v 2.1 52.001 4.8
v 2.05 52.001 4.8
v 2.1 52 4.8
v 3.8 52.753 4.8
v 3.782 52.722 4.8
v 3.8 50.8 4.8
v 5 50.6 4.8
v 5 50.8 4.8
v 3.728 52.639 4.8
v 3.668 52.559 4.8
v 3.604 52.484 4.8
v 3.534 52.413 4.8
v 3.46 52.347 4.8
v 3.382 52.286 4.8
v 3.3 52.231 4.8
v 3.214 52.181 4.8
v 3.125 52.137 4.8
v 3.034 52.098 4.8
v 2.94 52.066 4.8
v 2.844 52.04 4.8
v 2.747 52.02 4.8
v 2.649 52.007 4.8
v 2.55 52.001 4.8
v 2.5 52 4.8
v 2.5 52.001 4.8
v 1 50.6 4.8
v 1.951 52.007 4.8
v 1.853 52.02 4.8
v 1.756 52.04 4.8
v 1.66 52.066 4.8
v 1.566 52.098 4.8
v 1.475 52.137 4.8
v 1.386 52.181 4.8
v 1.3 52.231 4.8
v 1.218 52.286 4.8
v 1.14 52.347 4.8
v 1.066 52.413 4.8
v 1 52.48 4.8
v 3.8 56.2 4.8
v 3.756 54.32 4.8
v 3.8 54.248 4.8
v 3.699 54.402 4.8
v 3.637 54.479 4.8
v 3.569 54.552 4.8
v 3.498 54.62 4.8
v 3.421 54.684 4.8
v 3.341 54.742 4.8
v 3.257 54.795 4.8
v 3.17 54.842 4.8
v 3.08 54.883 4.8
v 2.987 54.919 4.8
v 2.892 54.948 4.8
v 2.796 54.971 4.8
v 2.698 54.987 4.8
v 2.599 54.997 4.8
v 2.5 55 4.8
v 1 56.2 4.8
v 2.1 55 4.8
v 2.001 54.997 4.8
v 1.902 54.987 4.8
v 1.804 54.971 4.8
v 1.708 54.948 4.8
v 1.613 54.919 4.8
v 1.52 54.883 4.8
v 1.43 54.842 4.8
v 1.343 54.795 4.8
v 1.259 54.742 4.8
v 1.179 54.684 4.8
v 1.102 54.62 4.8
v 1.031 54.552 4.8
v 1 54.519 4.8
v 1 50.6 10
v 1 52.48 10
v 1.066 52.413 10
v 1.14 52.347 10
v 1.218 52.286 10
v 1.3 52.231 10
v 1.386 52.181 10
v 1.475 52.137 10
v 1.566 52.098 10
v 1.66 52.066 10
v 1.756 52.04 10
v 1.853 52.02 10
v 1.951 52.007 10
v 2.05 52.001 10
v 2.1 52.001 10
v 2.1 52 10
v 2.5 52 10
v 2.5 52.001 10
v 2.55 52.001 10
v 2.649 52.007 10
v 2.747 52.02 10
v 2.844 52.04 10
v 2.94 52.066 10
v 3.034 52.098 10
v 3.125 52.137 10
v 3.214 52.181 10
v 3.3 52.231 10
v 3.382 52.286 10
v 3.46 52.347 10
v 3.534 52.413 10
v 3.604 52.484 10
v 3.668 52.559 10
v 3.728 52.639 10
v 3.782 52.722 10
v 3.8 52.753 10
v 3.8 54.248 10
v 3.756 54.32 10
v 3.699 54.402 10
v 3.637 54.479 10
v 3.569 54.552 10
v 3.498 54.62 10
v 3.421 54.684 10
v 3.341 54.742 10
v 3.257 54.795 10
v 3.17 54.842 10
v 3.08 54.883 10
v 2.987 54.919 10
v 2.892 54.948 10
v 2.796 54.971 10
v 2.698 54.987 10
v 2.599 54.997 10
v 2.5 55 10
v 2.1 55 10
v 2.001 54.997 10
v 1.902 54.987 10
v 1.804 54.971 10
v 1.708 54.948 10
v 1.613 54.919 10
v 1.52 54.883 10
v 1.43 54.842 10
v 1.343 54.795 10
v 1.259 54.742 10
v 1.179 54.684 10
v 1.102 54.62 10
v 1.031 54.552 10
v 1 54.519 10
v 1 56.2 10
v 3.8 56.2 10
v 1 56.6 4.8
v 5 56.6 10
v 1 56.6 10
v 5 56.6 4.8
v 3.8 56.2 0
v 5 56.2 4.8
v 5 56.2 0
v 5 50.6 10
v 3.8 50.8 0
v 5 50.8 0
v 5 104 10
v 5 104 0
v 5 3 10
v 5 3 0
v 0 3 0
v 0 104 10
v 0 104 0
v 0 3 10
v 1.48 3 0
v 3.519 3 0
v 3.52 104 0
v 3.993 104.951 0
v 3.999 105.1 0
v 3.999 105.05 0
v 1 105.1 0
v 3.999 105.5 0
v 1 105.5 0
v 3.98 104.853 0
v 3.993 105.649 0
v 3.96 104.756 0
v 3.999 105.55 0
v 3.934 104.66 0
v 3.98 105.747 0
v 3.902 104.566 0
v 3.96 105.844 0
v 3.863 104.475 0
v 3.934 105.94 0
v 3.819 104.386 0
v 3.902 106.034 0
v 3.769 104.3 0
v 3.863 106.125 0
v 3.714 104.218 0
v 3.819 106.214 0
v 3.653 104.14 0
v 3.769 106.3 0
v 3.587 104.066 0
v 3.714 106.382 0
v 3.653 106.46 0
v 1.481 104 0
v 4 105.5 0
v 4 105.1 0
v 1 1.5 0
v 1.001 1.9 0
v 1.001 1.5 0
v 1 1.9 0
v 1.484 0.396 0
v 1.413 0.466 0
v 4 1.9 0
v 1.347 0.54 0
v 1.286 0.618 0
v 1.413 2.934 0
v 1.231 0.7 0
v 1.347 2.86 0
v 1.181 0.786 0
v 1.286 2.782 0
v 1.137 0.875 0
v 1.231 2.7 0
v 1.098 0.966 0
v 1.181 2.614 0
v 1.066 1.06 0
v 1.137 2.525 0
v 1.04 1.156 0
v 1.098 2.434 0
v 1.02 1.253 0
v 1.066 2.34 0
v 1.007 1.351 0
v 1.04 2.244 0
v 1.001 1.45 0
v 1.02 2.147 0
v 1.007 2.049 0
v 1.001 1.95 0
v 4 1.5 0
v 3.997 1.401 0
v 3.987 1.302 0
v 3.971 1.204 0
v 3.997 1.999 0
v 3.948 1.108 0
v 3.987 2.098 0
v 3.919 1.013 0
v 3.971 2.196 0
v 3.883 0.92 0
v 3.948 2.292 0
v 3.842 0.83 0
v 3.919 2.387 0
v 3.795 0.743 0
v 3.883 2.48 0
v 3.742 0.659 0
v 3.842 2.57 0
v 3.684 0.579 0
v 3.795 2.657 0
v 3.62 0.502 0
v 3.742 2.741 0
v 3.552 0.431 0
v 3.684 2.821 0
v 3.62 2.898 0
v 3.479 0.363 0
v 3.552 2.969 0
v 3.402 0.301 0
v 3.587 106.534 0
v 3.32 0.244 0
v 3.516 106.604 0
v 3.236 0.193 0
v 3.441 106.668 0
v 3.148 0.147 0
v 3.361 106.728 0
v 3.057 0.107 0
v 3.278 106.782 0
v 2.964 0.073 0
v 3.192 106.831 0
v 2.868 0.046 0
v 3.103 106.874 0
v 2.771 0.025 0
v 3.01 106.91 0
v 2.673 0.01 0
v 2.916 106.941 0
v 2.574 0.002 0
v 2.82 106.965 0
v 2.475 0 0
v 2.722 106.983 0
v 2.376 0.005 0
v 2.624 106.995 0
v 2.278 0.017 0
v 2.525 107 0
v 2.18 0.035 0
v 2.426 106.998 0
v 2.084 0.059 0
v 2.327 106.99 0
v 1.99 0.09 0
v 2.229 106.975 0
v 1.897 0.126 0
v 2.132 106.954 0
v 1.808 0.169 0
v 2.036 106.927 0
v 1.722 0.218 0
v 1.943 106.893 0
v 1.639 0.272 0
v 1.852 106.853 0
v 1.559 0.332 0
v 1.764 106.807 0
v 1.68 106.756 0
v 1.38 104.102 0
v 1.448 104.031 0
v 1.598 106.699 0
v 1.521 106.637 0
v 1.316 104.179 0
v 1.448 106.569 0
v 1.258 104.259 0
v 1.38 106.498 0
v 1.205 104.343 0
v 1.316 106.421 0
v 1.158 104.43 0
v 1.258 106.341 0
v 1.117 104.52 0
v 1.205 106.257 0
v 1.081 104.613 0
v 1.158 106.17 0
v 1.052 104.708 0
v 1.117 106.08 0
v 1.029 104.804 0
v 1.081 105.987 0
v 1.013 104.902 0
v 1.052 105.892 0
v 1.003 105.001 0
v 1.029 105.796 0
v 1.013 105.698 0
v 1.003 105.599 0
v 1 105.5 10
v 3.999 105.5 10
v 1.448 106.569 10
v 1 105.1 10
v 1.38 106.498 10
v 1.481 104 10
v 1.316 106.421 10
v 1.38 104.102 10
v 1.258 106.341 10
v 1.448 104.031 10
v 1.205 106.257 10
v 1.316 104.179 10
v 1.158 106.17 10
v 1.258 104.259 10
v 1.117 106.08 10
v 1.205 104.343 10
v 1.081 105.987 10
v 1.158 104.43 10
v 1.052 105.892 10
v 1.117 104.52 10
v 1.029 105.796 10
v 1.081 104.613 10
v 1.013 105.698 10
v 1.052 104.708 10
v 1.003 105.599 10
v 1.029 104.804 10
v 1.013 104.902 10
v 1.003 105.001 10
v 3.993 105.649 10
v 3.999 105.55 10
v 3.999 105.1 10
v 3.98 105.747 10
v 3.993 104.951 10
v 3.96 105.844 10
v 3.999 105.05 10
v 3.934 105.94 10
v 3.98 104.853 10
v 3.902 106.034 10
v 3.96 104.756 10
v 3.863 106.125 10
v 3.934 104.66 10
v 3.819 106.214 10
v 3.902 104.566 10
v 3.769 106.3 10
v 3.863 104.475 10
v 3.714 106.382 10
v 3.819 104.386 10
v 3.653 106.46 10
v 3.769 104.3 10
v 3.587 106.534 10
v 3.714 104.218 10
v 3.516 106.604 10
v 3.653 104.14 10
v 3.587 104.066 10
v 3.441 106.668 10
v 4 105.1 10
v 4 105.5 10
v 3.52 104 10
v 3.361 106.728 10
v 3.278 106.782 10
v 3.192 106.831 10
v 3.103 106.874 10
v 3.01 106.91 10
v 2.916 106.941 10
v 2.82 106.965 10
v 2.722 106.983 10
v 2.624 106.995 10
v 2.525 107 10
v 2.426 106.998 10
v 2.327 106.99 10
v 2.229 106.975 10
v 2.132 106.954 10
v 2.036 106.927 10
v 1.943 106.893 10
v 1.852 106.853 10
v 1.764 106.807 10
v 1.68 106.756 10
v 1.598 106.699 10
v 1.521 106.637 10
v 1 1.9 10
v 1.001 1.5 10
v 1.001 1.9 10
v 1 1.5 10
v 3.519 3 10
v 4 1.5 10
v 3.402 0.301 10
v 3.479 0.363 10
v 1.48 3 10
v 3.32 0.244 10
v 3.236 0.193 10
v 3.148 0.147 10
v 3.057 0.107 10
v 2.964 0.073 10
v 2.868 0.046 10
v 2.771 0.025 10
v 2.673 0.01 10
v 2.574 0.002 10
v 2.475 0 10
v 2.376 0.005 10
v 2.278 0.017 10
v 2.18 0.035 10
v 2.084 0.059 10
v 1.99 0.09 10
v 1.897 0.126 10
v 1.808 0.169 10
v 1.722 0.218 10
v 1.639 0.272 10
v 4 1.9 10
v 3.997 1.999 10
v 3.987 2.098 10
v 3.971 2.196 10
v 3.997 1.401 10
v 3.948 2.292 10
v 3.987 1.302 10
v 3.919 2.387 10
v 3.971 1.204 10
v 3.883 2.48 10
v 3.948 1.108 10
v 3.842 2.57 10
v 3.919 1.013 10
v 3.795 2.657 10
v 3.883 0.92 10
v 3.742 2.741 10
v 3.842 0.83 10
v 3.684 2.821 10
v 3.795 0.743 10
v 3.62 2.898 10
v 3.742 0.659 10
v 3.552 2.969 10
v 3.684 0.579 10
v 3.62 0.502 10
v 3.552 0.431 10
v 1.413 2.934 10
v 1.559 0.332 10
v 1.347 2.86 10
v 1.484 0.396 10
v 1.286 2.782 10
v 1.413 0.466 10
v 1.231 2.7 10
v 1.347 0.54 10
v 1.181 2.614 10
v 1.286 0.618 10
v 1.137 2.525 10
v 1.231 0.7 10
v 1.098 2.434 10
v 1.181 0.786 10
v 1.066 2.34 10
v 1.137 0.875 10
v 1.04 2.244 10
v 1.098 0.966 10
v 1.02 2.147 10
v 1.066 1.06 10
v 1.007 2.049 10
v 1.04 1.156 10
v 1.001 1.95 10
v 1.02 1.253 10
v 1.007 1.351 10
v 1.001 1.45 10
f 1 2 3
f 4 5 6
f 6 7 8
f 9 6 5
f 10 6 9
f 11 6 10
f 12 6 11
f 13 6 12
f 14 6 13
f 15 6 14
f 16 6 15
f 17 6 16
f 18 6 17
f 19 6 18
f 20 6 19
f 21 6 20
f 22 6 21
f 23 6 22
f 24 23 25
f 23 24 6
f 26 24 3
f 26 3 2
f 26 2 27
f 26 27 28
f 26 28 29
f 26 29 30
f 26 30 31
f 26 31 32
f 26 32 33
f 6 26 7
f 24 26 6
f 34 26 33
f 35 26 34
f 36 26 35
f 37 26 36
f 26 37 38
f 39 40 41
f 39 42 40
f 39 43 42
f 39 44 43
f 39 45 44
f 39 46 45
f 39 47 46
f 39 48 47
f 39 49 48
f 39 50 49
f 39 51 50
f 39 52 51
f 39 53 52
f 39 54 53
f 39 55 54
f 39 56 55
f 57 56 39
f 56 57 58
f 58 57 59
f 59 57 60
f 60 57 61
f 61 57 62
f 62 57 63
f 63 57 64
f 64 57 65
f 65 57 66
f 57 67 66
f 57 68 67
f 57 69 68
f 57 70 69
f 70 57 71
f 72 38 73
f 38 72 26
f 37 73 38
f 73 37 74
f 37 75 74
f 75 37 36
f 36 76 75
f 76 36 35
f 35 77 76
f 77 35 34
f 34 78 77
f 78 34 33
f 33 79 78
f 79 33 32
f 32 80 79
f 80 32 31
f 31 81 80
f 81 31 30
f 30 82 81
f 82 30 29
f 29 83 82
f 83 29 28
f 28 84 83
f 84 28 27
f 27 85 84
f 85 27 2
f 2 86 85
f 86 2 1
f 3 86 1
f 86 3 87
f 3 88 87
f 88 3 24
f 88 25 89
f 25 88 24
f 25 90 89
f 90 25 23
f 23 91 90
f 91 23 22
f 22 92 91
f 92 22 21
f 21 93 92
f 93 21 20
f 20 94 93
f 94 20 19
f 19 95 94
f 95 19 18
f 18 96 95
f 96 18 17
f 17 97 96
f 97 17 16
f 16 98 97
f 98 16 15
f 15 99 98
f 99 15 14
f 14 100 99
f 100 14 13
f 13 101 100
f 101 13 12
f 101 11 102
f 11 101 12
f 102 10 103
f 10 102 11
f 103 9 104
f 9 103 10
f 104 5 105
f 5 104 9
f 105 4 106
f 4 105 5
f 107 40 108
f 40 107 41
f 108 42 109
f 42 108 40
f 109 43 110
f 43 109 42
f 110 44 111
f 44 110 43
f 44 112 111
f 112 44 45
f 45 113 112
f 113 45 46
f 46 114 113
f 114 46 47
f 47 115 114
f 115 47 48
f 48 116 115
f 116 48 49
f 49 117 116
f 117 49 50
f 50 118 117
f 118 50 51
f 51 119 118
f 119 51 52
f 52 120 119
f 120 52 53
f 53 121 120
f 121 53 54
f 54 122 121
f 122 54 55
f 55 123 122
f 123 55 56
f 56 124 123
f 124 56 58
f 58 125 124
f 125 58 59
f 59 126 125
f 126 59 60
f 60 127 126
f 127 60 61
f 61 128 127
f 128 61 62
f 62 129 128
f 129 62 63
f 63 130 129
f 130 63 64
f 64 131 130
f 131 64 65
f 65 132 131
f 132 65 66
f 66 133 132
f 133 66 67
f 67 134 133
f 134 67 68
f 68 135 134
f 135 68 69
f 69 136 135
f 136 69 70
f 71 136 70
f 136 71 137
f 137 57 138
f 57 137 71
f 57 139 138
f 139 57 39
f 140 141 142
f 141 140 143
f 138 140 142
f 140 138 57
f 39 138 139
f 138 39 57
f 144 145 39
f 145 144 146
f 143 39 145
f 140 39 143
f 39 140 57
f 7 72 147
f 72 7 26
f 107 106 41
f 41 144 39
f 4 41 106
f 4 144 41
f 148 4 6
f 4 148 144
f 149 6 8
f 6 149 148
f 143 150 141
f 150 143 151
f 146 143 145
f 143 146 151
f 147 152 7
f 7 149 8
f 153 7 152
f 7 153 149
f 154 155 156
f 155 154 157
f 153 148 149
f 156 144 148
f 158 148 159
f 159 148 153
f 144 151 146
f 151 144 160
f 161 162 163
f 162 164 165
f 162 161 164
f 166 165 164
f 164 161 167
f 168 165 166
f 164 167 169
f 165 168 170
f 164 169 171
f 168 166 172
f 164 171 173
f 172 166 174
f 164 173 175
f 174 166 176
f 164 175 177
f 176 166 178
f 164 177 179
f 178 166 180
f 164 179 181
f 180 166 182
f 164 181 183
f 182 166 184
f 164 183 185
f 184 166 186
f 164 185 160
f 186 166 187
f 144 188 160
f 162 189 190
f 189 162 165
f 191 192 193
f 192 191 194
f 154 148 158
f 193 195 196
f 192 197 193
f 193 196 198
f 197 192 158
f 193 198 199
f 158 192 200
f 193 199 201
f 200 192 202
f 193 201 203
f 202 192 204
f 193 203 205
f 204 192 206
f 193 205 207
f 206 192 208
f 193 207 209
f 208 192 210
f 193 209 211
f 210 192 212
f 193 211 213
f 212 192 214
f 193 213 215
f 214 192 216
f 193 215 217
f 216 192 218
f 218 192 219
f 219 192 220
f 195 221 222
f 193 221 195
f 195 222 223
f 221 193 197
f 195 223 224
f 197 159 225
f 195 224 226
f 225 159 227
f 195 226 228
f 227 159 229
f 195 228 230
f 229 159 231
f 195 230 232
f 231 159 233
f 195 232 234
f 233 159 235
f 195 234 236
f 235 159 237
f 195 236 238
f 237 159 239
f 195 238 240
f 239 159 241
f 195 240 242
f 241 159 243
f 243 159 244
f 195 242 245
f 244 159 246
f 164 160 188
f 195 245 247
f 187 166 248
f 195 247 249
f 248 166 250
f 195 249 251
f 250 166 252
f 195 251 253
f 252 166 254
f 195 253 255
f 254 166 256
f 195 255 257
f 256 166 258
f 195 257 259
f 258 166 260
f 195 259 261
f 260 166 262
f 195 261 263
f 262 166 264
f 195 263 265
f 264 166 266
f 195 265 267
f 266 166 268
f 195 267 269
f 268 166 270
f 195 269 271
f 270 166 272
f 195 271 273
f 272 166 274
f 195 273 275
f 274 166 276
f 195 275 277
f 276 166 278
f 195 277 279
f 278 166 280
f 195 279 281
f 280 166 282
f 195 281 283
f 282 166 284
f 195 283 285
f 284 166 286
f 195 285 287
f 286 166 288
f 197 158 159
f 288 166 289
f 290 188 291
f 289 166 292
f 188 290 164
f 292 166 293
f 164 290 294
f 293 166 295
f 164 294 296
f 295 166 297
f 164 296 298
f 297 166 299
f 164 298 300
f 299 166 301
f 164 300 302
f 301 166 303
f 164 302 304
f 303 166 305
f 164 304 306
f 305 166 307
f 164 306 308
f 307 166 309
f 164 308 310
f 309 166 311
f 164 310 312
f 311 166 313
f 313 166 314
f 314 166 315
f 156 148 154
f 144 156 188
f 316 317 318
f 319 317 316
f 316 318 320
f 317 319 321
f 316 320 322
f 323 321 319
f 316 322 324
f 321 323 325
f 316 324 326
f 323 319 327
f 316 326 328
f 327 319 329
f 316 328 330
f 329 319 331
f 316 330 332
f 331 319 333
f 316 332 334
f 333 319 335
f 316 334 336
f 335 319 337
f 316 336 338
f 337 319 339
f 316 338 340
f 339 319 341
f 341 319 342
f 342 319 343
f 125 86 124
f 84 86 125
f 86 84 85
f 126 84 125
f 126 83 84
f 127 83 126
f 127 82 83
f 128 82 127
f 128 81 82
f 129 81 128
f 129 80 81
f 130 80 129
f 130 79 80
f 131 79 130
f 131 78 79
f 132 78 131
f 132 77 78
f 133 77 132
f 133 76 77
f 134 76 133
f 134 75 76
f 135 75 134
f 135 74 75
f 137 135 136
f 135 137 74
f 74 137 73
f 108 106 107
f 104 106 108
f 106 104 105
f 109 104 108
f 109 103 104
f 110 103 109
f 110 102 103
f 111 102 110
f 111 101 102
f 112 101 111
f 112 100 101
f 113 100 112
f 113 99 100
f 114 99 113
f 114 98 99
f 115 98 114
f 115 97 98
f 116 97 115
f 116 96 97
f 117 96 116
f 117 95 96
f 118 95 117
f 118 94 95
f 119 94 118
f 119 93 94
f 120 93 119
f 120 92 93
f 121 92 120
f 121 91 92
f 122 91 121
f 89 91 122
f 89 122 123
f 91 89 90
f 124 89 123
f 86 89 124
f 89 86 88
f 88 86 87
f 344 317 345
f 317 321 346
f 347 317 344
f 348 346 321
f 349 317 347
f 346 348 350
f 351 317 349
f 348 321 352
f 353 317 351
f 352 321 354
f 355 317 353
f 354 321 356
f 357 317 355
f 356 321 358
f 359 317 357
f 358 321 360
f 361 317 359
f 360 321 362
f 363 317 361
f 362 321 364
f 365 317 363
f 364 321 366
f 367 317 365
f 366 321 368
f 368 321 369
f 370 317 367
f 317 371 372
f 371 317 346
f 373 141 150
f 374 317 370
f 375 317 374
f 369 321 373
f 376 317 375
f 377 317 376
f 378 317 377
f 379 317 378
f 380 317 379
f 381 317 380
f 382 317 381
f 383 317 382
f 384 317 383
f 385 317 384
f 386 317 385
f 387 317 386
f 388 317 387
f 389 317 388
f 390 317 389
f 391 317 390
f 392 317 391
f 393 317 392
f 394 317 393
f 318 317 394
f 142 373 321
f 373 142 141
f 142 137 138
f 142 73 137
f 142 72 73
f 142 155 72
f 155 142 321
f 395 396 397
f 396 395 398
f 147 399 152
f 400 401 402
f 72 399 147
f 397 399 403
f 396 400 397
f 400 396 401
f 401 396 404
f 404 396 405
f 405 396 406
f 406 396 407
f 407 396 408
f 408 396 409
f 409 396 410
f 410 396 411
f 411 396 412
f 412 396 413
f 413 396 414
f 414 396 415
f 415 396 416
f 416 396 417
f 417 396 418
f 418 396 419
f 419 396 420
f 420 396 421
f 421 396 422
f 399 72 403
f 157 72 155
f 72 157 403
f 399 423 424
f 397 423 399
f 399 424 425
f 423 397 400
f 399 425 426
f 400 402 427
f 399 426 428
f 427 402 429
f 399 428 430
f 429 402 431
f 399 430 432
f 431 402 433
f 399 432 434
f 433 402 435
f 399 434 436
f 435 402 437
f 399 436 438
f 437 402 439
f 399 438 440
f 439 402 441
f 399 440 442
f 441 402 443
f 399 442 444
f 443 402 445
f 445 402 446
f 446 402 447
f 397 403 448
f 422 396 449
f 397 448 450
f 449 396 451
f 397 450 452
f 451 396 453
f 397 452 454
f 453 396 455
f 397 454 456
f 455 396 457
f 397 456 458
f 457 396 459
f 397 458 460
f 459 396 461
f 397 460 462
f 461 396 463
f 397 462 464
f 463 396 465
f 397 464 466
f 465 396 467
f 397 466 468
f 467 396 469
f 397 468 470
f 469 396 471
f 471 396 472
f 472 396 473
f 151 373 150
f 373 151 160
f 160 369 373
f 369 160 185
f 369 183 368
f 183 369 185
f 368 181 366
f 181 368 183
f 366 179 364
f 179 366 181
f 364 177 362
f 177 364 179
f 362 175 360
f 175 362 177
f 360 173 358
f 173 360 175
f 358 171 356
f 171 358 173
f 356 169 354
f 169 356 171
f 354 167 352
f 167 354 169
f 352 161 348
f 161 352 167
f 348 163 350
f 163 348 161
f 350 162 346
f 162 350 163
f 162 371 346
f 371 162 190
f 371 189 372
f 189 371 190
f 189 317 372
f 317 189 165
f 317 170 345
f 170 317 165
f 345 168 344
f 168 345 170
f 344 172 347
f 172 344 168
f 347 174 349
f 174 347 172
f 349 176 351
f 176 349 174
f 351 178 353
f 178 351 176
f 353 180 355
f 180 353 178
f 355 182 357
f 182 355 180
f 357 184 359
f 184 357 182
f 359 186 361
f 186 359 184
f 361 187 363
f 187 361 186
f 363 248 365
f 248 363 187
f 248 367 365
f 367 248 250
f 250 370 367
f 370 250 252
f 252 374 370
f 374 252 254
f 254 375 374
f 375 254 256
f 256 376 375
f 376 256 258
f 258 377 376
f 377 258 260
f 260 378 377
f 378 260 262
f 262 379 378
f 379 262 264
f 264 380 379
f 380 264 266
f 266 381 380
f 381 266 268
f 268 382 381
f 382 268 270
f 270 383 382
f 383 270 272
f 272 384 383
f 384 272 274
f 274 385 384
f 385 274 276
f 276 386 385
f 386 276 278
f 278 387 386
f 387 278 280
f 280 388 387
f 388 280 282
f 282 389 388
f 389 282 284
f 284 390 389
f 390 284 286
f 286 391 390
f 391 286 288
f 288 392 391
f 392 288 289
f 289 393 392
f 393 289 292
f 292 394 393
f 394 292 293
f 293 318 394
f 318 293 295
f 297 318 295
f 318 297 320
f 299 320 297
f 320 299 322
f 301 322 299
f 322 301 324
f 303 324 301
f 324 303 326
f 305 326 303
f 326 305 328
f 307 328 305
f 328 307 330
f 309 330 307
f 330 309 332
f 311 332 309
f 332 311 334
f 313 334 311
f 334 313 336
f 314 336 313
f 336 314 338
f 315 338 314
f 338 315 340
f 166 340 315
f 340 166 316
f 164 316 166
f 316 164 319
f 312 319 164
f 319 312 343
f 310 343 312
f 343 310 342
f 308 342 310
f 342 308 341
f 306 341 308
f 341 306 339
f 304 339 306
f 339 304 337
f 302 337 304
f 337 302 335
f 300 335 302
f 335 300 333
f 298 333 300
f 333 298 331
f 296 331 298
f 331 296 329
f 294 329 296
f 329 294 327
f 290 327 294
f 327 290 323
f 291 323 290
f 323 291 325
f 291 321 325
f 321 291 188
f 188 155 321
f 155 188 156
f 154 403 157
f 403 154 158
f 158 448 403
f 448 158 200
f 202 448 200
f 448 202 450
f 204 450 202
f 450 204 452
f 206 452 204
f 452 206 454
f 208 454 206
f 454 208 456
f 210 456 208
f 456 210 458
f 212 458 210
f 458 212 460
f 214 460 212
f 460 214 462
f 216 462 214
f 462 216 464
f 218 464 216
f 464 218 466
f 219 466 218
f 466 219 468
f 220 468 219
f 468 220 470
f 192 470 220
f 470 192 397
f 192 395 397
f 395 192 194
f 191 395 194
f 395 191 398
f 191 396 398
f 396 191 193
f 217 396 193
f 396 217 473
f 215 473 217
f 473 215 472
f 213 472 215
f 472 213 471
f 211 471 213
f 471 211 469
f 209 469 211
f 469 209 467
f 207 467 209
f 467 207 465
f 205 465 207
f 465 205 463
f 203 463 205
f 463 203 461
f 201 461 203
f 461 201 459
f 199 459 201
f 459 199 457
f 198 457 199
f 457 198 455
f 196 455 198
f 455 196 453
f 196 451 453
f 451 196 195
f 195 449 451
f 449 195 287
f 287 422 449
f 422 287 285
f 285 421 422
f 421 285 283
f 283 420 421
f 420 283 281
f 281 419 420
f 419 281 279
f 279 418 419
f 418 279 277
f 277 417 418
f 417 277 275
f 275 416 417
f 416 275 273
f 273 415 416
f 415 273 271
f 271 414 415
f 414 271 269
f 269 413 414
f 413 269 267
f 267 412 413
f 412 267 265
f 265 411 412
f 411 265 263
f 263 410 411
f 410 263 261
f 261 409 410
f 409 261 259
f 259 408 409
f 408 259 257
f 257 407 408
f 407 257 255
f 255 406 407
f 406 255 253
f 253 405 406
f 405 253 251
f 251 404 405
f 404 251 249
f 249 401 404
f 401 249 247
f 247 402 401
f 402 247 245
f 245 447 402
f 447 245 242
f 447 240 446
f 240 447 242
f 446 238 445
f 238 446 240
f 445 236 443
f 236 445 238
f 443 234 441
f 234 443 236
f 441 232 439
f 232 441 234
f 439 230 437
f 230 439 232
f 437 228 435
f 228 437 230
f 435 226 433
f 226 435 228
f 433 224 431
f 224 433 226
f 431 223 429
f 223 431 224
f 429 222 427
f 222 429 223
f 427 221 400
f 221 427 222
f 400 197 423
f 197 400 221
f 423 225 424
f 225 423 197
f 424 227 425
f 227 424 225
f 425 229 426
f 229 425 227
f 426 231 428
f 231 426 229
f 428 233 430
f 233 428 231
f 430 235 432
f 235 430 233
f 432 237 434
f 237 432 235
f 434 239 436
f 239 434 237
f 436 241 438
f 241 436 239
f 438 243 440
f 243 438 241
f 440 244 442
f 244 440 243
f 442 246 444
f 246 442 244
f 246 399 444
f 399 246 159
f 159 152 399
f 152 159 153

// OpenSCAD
// file: ../common.scad
module fillet(r = 0.3, r2 = 0.3) {
  // フィレットモジュール
  // 使用例: fillet(r=0.5) { ... }
  // 注意: フィレットはオフセットの前に適用されるため、オフセットと組み合わせて使用することが一般的です。
  offset(r=r) offset(r=-r2) children();
}
// file: constants.scad
$fa = 0.1;
$fs = 0.1;

PITCH = 18;
w = 5;
rH = 7; // 仕切りレール高さ
rB = 2; // 仕切りレールの底面の厚み
pD = 10; // 柱の幅
// pH = 146; // 柱の高さ
pH = 20;
CONNECTOR_CIRCLE_WIDTH = 3; // メスコネクタの幅
CONNECTOR_DEPTH = 3; // メスコネクタの高さ方向の奥行き
CONNECTOR_ELLIPSE_LENGTH = 0.4; // 半円の下にどれくらいの直線区間を付けるか
mfDiff = 0.2; // メスコネクタの差し込み部分の余裕

PLATE_JOINT_SPRING_RADIUS = pD * 2; // プレートジョイントのバネの円の半径
PLATE_JOINT_SPRING_DEPTH = 1.2; // プレートジョイントのバネの厚み
PLATE_JOINT_SPRING_ARC_LENGTH = (pD * 1.5) - (mfDiff * 2); // プレートジョイントのバネの円弧長
PLATE_JOINT_SPRING_PILLAR_WIDTH = 2;
PLATE_JOINT_SPRING_LENGTH = (pD * 2) - (mfDiff * 2); // プレートジョイントのバネの全体の長さ
// main file
include <constants.scad>;
use <../common.scad>;

// 実験用プレート
let () {
  roof_connector(center_male = true);
  // ceiling_connector();
}

// 天井用
module roof_connector(width = PITCH * 6, center_male = false) {
  translate([0, 0, pD]) mirror([1, 0, 0]) rotate([-90, 0, 90])
  let (width = width - 1) {
    difference() {
      cube([width, pD, w]);

      // 両端のコネクタ
      color("red") translate([((0 - rB) + width) - CONNECTOR_DEPTH, pD / 2, w]) rotate([0, 90, 0]) pillar_male();
      color("red") translate([rB + CONNECTOR_DEPTH, pD / 2, 0]) rotate([0, -90, 0]) pillar_male();

      // 中間のコネクタ
      // color("red") translate([width / 2, rB + CONNECTOR_DEPTH, w]) rotate([90, 90, 0]) pillar_male();
      // color("red") translate([width / 2, rB + CONNECTOR_DEPTH, w]) rotate([-90, 90, 0]) pillar_male();
      if (center_male) {
        translate([(width / 2) - (w / 2), 0, -1]) pillar_male(w = w);
        translate([(width / 2) + (w / 2) + mfDiff, (0 - (pD / 2)) + mfDiff, 1]) cube([mfDiff * 2, pD, 10]);
        translate([(width / 2) - (w / 2) - (mfDiff * 2), (0 - (pD / 2)) + mfDiff, 1]) cube([mfDiff * 2, pD, 10]);
        translate([(width / 2), pD / 2, w - mfDiff]) cube([w + (mfDiff * 2), pD * 2, 2], center = true);
      }
    }
  }
}

// 天井同士の縦方向連結
module ceiling_connector(length = 50 + mfDiff, width = w) {
  translate([0, w - mfDiff, 0]) mirror([0, 1, 0]) rotate([90, 0, 0]) linear_extrude(height = (length - (w * 2)) + (mfDiff * 2)) fillet() square([width, 1]);
  translate([w / 2, w - mfDiff, 0]) rotate([90, 0, 0]) linear_extrude(height = (pD / 2) - mfDiff) connector_female_2d(height = 4);
  translate([w / 2, length, 0]) rotate([90, 0, 0]) linear_extrude(height = (pD / 2) - mfDiff) connector_female_2d(height = 4);
}

// 中間の横2連レール
*let () {
  // translate([4, 64, -12]) rotate([90, 0 ,90])
  translate([w, 0, 0])
  {
    rail(length = space);
    translate([0, space + (PITCH * 0), 0]) rail(pillar = true, sideL = false, sideR = false);
    translate([0, space + (PITCH * 1), 0]) rail(pillar = false, sideL = false, sideR = false);
    translate([0, space + (PITCH * 2), 0]) rail(length = PITCH / 2);
    translate([0, space + (PITCH * 2.5), 0]) rail(pillar = true, sideL = false, sideR = false);
    translate([0, space + (PITCH * 3.5), 0]) rail(length = PITCH / 2);
    translate([0, space + (PITCH * 4), 0]) rail(pillar = false, sideL = false, sideR = false);
    translate([0, space + (PITCH * 5), 0]) rail(pillar = true, sideL = false, sideR = false);
    translate([0, space + (PITCH * 6), 0]) rail(length = space);
    translate([0 - w, 0, 0]) {
      rail(length = space);
      translate([0, space + (PITCH * 0), 0]) rail(pillar = true, sideL = false, sideR = false);
      translate([0, space + (PITCH * 1), 0]) rail(pillar = false, sideL = false, sideR = false);
      translate([0, space + (PITCH * 2), 0]) rail(length = PITCH / 2);
      translate([0, space + (PITCH * 2.5), 0]) rail(pillar = true, sideL = false, sideR = false);
      translate([0, space + (PITCH * 3.5), 0]) rail(length = PITCH / 2);
      translate([0, space + (PITCH * 4), 0]) rail(pillar = false, sideL = false, sideR = false);
      translate([0, space + (PITCH * 5), 0]) rail(pillar = true, sideL = false, sideR = false);
      translate([0, space + (PITCH * 6), 0]) rail(length = space);
    }
  }
}

// デスク引っ掛け用のツメ
let (depth = 5, width = pD + (mfDiff * 2), length = 5) {
  *linear_extrude(height = rB - mfDiff)
  {
    translate([0, length])
    let (
      r = PLATE_JOINT_SPRING_RADIUS, // 円の半径。バネの傾きを決定する
      depth = PLATE_JOINT_SPRING_DEPTH, // バネの厚み
      arc_length = PLATE_JOINT_SPRING_ARC_LENGTH, // 円弧長
      width = PLATE_JOINT_SPRING_PILLAR_WIDTH, // 直線部分の幅
      length = PLATE_JOINT_SPRING_LENGTH / 2 // 全体の長さ
    ) {
      translate([0, length - depth, 0]) // 直線部分に接続する
      plate_joint_spring_arc_2d(d = depth, r = r, x = arc_length);
      translate([0 - (width / 2), 0, 0])
      square([width, length - (depth * 2)]);
    }
    translate([0, length / 2]) square([width, length], center = true);
  }
}

// 柱
module pillar(ymax = 1, segment_height = 7, end_connector = false, side_connectors = [], pD = pD) {
  linear_extrude(height = pD)
  {
    translate([0,  0 * segment_height, 0]) translate([w / 2, segment_height, 0]) mirror([0, 1, 0]) connector_female_2d(segment_height);
    if (ymax - (end_connector ? 1 : 0) >= 1) for (y = [1 : ymax - (end_connector ? 1 : 0)]) translate([0,  y * segment_height, 0]) fillet() square([w, segment_height]);
    if (end_connector) translate([0,  ymax * segment_height, 0]) translate([w / 2, 0, 0]) connector_female_2d(segment_height);
    if (len(side_connectors) > 0) for (i = [0 : len(side_connectors) - 1]) {
      translate([0, ((side_connectors[i] * segment_height) - (w * 1)) + (w / 2)]) rotate([0, 0, 90]) connector_female_2d(CONNECTOR_DEPTH + 1);
    }
  }
}

module rail(length = PITCH, pillar = false, sideL = false, sideR = false) {
  difference()
  {
    mirror([0, 1, 0]) rotate([90, 0, 0]) linear_extrude(height = length) rail_2d();
    translate([0, PITCH / 2, 0])
    {
      if (pillar) pillar_male();
      if (sideL) side_male();
      if (sideR) side_male(true);
    }
  }
}

module connector_inner_2d(female = false) {
  cW = CONNECTOR_CIRCLE_WIDTH + (female ? (mfDiff * 2) : 0);
  cH = CONNECTOR_DEPTH + (female ? mfDiff : 0);
  cH2 = CONNECTOR_ELLIPSE_LENGTH - (female ? mfDiff : 0);

  color("red") 
  translate([0, cH - (cW / 2)]) difference() {
    circle(r=cW / 2);
    translate([0 - (cW / 2), 0 - cW]) square([cW, cW]);
  }
  color("blue") translate([0 - (cW / 2), cH - (cW / 2) - cH2]) square([cW, cH2]);
  color("green") 
  translate([0, cH - (cW / 2) - cH2])
  difference() {
    circle(r=cW / 2);
    translate([0 - (cW / 2), 0]) square([cW, cW]);
  }
}

module rail_2d() {
  square([w, rH - (w / 2)]);
  translate([w / 2, rH - (w / 2)]) circle(r=w / 2);
}

// メス側
module connector_female_2d(height = pH) {
  translate([0 - (w / 2), height])
  mirror([0, 1, 0])
  fillet() difference() {
    square([w, height]);
    translate([w / 2, 0]) connector_inner_2d(female = true);
  }
}

// 柱用の切り欠き
module pillar_male(w = w) {
  translate([0, mfDiff + (pD / 2), 0]) 
  rotate([90, 0, 0])
  linear_extrude(height = pD + (mfDiff * 2)) {
    translate([0, rB]) difference() {
      translate([0 - mfDiff, 0]) square([w + (mfDiff * 2), pH]);
      translate([w / 2, 0]) connector_inner_2d();
    }
  }
}

// 横用の切り欠き
module side_male(mirror = false) {
  translate([(w/ 2) + (mfDiff * 2 * (mirror ? -1 : 1)), 0, 0])
  rotate([0, 0, 90 * (mirror ? -1 : 1)])
  translate([0 - (w / 2), 0, rH])
  mirror([0, 0, 1]) 
  difference()
  {
    linear_extrude(height = rH) {
      difference() {
        translate([0 - (mfDiff * 2), 0]) square([w + (mfDiff * 4), pH]);
        translate([w / 2, 0]) connector_inner_2d();
      }
    }
    // translate([w + 1, 0 - ((w / 2) * 1.6), 1]) rotate([-90, 0, 90])
    // linear_extrude(height = w + 2) {
    //   square([w, rH - (w / 2)]);
    //   translate([w / 2, 0]) circle(r=w / 2);
    // }
    translate([-1, -1, -4.5]) rotate([30, 0, 0])
    cube([10, 5, 10]);
  }
}

// プレート間のジョイントの切り欠き
module plate_joint_male() {
  // rotate([0, 0, 90]) {
  //   translate([0 - (w / 2), 0, 0 - rB]) pillar_male();
  //   translate([0 - (w / 2), 0 - ((pD + (mfDiff * 2)) / 2), (rB - 1) - mfDiff]) cube([w, pD + (mfDiff * 2), 5]);
  // }

  r = PLATE_JOINT_SPRING_RADIUS;
  arc_length = PLATE_JOINT_SPRING_ARC_LENGTH;
  x = arc_length;
  chord_half = r * sin((x / (2 * r)) * (180 / PI)); // 円弧長から弦の半幅を求める
  y = r - sqrt(pow(r, 2) - pow(chord_half, 2)); // 矢高（サジッタ）
  depth = 5;
  width = (chord_half * 2) + (mfDiff * 2);
  pillar_width = PLATE_JOINT_SPRING_PILLAR_WIDTH + (mfDiff * 2);
  spring_depth = 0.2; // バネをたわませる距離
  yi = y * (r - PLATE_JOINT_SPRING_DEPTH) / r; // 内側円弧の矢高（スプリング端の下側の位置）
  translate([0 - (width / 2), (PLATE_JOINT_SPRING_LENGTH / 2) - (yi + PLATE_JOINT_SPRING_DEPTH) + spring_depth, 0]) cube([width, depth, 10]);
  translate([0 - (pillar_width / 2), 0, 0]) cube([pillar_width, PLATE_JOINT_SPRING_LENGTH / 2, 10]);
}

// プレートの端
module plate_edge(width = PITCH, slope = false, joint = false, rear = false) {
  translate([0, rear ? width : 0, 0]) mirror([0, rear ? 1 : 0, 0])
  difference()
  {
    cube([PITCH, width, rB]);
    if (slope) color("red") translate([0, w / 2, rB]) rotate([5, 0, 0]) translate([0, 0 - (w / 2), 0]) cube([PITCH, width, 10]);
    if (joint) translate([PITCH / 2, 0, 0]) plate_joint_male();
  }
}

// プレート同士を接続するバネコネクタ
module plate_joint_spring(
  height = rB - mfDiff, // バネの高さ、プレートの厚みから差し込み部分の余裕を引いた値
  r = PLATE_JOINT_SPRING_RADIUS, // 円の半径。バネの傾きを決定する
  depth = PLATE_JOINT_SPRING_DEPTH, // バネの厚み
  arc_length = PLATE_JOINT_SPRING_ARC_LENGTH, // 円弧長
  width = PLATE_JOINT_SPRING_PILLAR_WIDTH, // 直線部分の幅
  length = PLATE_JOINT_SPRING_LENGTH // 全体の長さ
) {
  // arc_length = r * 2 * asin(spring_width / r) * (PI / 180); // 弦の半幅から円弧長に変換

  linear_extrude(height = height)
  {
    translate([0, length - depth, 0]) // 直線部分に接続する
    translate([0, depth, 0]) // バネの天端の内側を原点に合わせる
    plate_joint_spring_arc_2d(d = depth, r = r, x = arc_length);
    translate([0 - (width / 2), depth, 0])
    square([width, length - (depth * 2)]);
    mirror([0, 1, 0]) 
    plate_joint_spring_arc_2d(d = depth, r = r, x = arc_length);
  }
}
module plate_joint_spring_arc_2d(d, r, x) {
  // x: 円弧の曲線の長さ
  chord_half = r * sin((x / (2 * r)) * (180 / PI)); // 円弧長から弦の半幅を求める
  y = r - sqrt(pow(r, 2) - pow(chord_half, 2)); // 矢高（サジッタ）
  t = atan2(0 - chord_half, sqrt(pow(r, 2) - pow(chord_half, 2)));
  difference()
  {
    translate([0, 0 - (r - y), 0]) // バネの上端を原点に合わせる
    difference()
    {
      translate([0, 0 - y, 0]) difference() {
        circle(r = r);
        circle(r = r - d);
      }
      mirror([1, 0, 0]) rotate([0, 0, t]) square(pD * 10);
      rotate([0, 0, t]) square(pD * 10);
      translate([0 - pD * 5, 0 - (pD * 10), 0]) square(pD * 10);
    }
    plate_joint_spring_arc_fillet_2d(r, d, chord_half, y, t);
    mirror([1, 0, 0]) plate_joint_spring_arc_fillet_2d(r, d, chord_half, y, t);
  }
}
module plate_joint_spring_arc_fillet_2d(r, d, x, y, t) {
  q = sqrt(pow(r, 2) - pow(x, 2));
  K = (0 - d / 2 - y * x / r) / (r - d / 2);
  C = sqrt(1 - pow(K, 2));
  px = (r - d / 2) * (K * q + C * x) / r;
  py = -y + (r - d / 2) * (C * q - K * x) / r;
  color("red")
  translate([px, py - q, 0])
  difference()
  {
    circle(r = d * 10);
    circle(r = d / 2);
    mirror([1, 0]) rotate([0, 0, 0 - t]) translate([0, 0 - (pD * 5)]) square(pD * 10);
  }
}
